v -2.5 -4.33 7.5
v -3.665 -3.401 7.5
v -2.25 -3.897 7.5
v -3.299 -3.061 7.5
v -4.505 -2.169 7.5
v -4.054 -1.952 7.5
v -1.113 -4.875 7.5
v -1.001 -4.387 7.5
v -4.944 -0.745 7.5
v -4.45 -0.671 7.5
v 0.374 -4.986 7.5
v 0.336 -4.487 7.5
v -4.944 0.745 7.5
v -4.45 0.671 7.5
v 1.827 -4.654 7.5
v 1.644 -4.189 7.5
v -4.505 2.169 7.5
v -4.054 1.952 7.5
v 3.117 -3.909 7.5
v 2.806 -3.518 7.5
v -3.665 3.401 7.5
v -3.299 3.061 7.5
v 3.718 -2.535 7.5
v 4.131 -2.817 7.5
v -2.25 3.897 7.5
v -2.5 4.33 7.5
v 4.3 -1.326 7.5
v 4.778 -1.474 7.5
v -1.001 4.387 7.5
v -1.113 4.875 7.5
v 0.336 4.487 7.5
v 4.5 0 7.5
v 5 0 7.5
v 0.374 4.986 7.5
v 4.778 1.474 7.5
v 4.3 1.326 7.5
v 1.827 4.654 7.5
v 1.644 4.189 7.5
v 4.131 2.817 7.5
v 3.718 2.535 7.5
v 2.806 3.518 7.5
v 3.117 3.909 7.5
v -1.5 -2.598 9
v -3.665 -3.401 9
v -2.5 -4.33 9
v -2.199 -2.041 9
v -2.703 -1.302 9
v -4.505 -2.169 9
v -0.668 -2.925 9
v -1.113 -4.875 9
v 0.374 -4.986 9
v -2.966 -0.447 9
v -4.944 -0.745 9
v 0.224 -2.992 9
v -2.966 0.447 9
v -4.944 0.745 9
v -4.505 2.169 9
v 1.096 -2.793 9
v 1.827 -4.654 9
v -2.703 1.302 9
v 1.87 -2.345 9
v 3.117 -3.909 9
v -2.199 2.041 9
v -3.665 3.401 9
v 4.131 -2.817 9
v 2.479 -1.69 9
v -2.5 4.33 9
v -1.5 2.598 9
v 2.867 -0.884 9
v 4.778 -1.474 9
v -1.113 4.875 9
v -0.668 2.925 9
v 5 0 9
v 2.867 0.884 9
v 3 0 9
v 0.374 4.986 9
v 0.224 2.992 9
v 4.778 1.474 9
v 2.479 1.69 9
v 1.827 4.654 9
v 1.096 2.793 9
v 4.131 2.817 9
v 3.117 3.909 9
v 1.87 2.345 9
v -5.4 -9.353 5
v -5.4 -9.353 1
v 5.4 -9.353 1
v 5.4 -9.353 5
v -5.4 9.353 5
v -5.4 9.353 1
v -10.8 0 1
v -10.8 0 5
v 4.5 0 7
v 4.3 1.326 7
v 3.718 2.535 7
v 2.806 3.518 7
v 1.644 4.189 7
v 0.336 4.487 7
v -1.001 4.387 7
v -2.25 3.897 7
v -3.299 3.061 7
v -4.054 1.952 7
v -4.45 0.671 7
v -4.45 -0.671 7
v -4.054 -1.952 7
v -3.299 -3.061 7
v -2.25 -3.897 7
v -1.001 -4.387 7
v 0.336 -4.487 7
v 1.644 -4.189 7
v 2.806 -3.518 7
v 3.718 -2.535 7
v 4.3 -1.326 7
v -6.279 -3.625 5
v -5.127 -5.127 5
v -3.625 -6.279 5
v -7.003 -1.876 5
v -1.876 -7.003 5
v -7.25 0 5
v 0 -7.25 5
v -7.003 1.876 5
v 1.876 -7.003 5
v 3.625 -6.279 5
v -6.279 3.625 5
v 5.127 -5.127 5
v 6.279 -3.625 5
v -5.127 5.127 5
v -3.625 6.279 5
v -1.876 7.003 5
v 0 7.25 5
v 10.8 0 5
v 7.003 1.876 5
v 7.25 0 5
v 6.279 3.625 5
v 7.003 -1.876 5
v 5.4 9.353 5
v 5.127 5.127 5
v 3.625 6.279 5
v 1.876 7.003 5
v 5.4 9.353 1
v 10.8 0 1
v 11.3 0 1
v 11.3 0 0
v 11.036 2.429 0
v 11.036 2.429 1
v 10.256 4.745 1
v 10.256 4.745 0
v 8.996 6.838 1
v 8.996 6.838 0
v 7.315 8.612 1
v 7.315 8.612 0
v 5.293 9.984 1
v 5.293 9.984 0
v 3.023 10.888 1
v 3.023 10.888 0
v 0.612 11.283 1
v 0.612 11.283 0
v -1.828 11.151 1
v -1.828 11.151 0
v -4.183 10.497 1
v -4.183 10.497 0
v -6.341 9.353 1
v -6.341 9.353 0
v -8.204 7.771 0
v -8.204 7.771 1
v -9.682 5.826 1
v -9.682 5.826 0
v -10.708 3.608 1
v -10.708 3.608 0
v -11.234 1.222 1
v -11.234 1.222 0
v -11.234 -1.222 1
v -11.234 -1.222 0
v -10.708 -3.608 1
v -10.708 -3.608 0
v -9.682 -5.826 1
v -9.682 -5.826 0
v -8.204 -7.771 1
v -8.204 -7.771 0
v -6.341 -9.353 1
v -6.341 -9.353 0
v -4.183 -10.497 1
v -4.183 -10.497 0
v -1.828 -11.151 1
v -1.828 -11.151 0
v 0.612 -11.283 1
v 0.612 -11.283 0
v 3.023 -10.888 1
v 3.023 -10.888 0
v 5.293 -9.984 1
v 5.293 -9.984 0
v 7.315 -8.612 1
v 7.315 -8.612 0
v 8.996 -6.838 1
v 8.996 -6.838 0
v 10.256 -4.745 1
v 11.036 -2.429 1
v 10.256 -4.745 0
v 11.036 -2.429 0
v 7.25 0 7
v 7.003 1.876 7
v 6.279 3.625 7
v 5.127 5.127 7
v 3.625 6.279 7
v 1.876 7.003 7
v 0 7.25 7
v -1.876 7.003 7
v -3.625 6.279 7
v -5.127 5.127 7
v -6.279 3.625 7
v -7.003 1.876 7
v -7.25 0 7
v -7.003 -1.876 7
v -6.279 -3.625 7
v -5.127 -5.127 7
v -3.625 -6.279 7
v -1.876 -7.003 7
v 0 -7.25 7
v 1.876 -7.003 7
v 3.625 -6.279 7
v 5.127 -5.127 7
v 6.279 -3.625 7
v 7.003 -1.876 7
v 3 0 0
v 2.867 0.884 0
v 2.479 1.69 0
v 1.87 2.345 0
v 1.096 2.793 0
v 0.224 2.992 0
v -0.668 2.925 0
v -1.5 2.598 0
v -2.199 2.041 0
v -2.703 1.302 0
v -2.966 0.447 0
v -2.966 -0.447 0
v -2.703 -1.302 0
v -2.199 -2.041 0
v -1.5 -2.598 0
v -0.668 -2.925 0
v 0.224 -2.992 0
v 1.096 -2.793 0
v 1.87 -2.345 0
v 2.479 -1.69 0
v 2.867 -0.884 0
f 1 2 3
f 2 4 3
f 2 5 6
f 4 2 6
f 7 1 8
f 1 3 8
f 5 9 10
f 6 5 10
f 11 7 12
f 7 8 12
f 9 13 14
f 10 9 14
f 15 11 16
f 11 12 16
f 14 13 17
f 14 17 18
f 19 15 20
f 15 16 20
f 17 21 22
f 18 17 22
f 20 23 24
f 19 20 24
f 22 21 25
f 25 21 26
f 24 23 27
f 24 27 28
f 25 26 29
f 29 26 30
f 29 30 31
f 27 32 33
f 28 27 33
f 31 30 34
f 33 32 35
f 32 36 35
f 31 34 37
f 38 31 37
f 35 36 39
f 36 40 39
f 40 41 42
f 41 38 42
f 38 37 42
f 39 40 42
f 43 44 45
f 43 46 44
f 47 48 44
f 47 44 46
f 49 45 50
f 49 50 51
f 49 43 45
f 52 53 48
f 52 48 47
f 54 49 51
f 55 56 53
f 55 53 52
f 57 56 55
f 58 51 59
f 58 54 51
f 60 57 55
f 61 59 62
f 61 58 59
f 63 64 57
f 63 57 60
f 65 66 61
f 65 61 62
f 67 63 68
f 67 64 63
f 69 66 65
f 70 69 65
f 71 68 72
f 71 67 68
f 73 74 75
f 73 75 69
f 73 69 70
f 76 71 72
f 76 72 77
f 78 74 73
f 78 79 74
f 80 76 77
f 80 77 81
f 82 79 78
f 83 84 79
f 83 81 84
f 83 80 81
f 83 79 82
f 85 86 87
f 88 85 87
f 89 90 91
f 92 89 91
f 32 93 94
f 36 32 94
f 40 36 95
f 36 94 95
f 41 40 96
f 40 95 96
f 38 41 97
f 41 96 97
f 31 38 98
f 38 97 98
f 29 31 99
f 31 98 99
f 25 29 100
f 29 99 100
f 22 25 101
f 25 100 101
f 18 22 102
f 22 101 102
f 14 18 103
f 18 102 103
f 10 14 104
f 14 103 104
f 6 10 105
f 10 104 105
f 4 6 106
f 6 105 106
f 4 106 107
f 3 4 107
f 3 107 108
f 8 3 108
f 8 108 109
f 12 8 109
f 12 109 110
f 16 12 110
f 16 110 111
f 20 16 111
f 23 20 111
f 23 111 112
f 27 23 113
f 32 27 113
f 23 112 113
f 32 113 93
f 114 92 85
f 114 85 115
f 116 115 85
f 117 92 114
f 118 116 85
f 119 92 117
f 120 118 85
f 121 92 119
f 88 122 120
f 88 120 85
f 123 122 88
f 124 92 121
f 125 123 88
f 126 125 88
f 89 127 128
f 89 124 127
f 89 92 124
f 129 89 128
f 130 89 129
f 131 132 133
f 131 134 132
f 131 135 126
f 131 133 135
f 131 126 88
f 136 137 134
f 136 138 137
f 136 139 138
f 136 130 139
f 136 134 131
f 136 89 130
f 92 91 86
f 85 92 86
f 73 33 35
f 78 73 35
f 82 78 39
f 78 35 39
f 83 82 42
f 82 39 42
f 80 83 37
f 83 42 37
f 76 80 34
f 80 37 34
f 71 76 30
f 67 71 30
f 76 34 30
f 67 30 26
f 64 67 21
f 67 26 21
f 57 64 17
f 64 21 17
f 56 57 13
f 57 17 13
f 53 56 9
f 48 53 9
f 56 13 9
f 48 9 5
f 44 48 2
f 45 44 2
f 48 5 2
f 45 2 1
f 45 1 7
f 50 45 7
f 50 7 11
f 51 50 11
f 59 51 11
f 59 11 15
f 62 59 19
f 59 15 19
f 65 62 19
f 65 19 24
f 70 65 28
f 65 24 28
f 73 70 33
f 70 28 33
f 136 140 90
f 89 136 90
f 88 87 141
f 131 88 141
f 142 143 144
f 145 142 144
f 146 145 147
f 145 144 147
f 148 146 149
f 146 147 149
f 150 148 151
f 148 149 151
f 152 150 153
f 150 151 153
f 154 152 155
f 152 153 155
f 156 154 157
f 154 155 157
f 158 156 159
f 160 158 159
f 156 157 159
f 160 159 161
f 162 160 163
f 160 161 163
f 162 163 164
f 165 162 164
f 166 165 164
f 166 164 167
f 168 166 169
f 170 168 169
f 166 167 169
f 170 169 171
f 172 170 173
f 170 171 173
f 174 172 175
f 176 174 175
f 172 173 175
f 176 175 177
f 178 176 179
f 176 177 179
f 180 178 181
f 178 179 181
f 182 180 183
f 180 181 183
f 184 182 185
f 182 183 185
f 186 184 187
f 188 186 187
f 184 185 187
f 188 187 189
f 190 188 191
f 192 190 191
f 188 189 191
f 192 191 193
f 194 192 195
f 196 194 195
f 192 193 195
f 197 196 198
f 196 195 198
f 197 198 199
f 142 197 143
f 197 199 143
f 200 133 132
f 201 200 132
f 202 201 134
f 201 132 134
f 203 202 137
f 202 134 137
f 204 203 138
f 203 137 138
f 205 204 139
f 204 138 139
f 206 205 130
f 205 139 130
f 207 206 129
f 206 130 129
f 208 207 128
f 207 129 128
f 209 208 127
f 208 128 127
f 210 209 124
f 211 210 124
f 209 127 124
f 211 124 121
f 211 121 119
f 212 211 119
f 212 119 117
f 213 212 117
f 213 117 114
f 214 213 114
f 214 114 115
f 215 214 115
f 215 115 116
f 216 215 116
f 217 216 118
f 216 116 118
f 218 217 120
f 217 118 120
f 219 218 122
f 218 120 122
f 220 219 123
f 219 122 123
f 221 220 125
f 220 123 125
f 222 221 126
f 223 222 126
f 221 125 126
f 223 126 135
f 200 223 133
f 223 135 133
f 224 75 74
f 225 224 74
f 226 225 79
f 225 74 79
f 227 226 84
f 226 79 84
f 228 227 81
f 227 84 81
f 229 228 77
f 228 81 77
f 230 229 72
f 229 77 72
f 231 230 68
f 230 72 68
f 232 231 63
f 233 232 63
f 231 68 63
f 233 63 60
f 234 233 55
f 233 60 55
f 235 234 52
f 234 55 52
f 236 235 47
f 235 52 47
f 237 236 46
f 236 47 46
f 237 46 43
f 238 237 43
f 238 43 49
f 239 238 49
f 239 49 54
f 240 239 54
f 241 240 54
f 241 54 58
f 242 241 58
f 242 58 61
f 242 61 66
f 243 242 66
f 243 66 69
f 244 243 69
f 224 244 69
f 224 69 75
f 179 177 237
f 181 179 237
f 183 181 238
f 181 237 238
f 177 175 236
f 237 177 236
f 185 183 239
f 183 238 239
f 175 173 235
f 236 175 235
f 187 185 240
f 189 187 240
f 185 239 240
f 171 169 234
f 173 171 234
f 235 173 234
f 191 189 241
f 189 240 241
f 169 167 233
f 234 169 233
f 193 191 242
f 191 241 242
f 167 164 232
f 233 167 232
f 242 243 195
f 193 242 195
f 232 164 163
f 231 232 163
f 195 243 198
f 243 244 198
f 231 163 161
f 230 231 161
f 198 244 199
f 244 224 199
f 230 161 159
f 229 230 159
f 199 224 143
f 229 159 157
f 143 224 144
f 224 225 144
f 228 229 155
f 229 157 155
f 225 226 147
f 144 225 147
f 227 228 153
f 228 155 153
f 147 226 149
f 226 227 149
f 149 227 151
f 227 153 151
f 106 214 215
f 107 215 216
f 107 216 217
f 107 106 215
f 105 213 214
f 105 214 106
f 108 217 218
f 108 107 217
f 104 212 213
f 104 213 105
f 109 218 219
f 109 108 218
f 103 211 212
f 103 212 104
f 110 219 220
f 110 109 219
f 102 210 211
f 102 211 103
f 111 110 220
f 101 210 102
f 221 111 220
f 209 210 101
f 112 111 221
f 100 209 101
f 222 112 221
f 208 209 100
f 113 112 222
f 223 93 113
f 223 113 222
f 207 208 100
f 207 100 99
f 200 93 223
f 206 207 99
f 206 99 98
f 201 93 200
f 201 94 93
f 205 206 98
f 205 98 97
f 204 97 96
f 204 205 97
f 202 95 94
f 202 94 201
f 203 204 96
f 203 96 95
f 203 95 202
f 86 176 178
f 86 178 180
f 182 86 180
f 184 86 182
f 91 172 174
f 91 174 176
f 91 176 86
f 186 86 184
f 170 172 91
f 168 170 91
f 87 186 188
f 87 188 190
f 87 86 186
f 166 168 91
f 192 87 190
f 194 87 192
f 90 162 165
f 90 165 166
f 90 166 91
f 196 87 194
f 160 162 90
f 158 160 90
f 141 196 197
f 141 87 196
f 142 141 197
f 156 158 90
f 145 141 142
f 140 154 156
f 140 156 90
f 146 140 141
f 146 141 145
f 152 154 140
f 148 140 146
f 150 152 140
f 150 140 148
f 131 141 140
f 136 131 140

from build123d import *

# Parameters (mm, degrees)
F0_R      = 11.3
F1_DEPTH  = 1
F2_DEPTH  = 5
F3_R      = 7.25
F4_DEPTH  = 2
F5_R      = 4.5
F6_DEPTH  = 0.5
F7_R      = 5
F8_DEPTH  = 1.5
F9_R      = 3
F10_DEPTH = 13.7


with BuildPart() as f1:
    # F0 (on Top) → F1 (new body)
    with BuildSketch(Plane.XY):
        Circle(F0_R)
        Polygon((10.8, 0), (5.4, -9.353074), (-5.4, -9.353074), (-10.8, 0), (-5.4, 9.353074), (5.4, 9.353074), align=None, mode=Mode.SUBTRACT)
        Polygon((-5.4, -9.353074), (5.4, -9.353074), (10.8, 0), (5.4, 9.353074), (-5.4, 9.353074), (-10.8, 0), align=None)
    extrude(amount=F1_DEPTH)

    # F0 (on Top) → F2 (join)
    with BuildSketch(Plane.XY):
        Polygon((-5.4, -9.353074), (5.4, -9.353074), (10.8, 0), (5.4, 9.353074), (-5.4, 9.353074), (-10.8, 0), align=None)
    extrude(amount=F2_DEPTH)

    # F3 (on face) → F4 (join)
    with BuildSketch(Plane.XY.offset(5)):
        Circle(F3_R)
    extrude(amount=F4_DEPTH)

    # F5 (on face) → F6 (join)
    with BuildSketch(Plane.XY.offset(7)):
        Circle(F5_R)
    extrude(amount=F6_DEPTH)

    # F7 (on face) → F8 (join)
    with BuildSketch(Plane.XY.offset(7.5)):
        Circle(F7_R)
    extrude(amount=F8_DEPTH)

    # F9 (on face) → F10 (cut)
    with BuildSketch(Plane.XY.offset(9)):
        Circle(F9_R)
    extrude(amount=-F10_DEPTH, mode=Mode.SUBTRACT)


solid = f1.part
